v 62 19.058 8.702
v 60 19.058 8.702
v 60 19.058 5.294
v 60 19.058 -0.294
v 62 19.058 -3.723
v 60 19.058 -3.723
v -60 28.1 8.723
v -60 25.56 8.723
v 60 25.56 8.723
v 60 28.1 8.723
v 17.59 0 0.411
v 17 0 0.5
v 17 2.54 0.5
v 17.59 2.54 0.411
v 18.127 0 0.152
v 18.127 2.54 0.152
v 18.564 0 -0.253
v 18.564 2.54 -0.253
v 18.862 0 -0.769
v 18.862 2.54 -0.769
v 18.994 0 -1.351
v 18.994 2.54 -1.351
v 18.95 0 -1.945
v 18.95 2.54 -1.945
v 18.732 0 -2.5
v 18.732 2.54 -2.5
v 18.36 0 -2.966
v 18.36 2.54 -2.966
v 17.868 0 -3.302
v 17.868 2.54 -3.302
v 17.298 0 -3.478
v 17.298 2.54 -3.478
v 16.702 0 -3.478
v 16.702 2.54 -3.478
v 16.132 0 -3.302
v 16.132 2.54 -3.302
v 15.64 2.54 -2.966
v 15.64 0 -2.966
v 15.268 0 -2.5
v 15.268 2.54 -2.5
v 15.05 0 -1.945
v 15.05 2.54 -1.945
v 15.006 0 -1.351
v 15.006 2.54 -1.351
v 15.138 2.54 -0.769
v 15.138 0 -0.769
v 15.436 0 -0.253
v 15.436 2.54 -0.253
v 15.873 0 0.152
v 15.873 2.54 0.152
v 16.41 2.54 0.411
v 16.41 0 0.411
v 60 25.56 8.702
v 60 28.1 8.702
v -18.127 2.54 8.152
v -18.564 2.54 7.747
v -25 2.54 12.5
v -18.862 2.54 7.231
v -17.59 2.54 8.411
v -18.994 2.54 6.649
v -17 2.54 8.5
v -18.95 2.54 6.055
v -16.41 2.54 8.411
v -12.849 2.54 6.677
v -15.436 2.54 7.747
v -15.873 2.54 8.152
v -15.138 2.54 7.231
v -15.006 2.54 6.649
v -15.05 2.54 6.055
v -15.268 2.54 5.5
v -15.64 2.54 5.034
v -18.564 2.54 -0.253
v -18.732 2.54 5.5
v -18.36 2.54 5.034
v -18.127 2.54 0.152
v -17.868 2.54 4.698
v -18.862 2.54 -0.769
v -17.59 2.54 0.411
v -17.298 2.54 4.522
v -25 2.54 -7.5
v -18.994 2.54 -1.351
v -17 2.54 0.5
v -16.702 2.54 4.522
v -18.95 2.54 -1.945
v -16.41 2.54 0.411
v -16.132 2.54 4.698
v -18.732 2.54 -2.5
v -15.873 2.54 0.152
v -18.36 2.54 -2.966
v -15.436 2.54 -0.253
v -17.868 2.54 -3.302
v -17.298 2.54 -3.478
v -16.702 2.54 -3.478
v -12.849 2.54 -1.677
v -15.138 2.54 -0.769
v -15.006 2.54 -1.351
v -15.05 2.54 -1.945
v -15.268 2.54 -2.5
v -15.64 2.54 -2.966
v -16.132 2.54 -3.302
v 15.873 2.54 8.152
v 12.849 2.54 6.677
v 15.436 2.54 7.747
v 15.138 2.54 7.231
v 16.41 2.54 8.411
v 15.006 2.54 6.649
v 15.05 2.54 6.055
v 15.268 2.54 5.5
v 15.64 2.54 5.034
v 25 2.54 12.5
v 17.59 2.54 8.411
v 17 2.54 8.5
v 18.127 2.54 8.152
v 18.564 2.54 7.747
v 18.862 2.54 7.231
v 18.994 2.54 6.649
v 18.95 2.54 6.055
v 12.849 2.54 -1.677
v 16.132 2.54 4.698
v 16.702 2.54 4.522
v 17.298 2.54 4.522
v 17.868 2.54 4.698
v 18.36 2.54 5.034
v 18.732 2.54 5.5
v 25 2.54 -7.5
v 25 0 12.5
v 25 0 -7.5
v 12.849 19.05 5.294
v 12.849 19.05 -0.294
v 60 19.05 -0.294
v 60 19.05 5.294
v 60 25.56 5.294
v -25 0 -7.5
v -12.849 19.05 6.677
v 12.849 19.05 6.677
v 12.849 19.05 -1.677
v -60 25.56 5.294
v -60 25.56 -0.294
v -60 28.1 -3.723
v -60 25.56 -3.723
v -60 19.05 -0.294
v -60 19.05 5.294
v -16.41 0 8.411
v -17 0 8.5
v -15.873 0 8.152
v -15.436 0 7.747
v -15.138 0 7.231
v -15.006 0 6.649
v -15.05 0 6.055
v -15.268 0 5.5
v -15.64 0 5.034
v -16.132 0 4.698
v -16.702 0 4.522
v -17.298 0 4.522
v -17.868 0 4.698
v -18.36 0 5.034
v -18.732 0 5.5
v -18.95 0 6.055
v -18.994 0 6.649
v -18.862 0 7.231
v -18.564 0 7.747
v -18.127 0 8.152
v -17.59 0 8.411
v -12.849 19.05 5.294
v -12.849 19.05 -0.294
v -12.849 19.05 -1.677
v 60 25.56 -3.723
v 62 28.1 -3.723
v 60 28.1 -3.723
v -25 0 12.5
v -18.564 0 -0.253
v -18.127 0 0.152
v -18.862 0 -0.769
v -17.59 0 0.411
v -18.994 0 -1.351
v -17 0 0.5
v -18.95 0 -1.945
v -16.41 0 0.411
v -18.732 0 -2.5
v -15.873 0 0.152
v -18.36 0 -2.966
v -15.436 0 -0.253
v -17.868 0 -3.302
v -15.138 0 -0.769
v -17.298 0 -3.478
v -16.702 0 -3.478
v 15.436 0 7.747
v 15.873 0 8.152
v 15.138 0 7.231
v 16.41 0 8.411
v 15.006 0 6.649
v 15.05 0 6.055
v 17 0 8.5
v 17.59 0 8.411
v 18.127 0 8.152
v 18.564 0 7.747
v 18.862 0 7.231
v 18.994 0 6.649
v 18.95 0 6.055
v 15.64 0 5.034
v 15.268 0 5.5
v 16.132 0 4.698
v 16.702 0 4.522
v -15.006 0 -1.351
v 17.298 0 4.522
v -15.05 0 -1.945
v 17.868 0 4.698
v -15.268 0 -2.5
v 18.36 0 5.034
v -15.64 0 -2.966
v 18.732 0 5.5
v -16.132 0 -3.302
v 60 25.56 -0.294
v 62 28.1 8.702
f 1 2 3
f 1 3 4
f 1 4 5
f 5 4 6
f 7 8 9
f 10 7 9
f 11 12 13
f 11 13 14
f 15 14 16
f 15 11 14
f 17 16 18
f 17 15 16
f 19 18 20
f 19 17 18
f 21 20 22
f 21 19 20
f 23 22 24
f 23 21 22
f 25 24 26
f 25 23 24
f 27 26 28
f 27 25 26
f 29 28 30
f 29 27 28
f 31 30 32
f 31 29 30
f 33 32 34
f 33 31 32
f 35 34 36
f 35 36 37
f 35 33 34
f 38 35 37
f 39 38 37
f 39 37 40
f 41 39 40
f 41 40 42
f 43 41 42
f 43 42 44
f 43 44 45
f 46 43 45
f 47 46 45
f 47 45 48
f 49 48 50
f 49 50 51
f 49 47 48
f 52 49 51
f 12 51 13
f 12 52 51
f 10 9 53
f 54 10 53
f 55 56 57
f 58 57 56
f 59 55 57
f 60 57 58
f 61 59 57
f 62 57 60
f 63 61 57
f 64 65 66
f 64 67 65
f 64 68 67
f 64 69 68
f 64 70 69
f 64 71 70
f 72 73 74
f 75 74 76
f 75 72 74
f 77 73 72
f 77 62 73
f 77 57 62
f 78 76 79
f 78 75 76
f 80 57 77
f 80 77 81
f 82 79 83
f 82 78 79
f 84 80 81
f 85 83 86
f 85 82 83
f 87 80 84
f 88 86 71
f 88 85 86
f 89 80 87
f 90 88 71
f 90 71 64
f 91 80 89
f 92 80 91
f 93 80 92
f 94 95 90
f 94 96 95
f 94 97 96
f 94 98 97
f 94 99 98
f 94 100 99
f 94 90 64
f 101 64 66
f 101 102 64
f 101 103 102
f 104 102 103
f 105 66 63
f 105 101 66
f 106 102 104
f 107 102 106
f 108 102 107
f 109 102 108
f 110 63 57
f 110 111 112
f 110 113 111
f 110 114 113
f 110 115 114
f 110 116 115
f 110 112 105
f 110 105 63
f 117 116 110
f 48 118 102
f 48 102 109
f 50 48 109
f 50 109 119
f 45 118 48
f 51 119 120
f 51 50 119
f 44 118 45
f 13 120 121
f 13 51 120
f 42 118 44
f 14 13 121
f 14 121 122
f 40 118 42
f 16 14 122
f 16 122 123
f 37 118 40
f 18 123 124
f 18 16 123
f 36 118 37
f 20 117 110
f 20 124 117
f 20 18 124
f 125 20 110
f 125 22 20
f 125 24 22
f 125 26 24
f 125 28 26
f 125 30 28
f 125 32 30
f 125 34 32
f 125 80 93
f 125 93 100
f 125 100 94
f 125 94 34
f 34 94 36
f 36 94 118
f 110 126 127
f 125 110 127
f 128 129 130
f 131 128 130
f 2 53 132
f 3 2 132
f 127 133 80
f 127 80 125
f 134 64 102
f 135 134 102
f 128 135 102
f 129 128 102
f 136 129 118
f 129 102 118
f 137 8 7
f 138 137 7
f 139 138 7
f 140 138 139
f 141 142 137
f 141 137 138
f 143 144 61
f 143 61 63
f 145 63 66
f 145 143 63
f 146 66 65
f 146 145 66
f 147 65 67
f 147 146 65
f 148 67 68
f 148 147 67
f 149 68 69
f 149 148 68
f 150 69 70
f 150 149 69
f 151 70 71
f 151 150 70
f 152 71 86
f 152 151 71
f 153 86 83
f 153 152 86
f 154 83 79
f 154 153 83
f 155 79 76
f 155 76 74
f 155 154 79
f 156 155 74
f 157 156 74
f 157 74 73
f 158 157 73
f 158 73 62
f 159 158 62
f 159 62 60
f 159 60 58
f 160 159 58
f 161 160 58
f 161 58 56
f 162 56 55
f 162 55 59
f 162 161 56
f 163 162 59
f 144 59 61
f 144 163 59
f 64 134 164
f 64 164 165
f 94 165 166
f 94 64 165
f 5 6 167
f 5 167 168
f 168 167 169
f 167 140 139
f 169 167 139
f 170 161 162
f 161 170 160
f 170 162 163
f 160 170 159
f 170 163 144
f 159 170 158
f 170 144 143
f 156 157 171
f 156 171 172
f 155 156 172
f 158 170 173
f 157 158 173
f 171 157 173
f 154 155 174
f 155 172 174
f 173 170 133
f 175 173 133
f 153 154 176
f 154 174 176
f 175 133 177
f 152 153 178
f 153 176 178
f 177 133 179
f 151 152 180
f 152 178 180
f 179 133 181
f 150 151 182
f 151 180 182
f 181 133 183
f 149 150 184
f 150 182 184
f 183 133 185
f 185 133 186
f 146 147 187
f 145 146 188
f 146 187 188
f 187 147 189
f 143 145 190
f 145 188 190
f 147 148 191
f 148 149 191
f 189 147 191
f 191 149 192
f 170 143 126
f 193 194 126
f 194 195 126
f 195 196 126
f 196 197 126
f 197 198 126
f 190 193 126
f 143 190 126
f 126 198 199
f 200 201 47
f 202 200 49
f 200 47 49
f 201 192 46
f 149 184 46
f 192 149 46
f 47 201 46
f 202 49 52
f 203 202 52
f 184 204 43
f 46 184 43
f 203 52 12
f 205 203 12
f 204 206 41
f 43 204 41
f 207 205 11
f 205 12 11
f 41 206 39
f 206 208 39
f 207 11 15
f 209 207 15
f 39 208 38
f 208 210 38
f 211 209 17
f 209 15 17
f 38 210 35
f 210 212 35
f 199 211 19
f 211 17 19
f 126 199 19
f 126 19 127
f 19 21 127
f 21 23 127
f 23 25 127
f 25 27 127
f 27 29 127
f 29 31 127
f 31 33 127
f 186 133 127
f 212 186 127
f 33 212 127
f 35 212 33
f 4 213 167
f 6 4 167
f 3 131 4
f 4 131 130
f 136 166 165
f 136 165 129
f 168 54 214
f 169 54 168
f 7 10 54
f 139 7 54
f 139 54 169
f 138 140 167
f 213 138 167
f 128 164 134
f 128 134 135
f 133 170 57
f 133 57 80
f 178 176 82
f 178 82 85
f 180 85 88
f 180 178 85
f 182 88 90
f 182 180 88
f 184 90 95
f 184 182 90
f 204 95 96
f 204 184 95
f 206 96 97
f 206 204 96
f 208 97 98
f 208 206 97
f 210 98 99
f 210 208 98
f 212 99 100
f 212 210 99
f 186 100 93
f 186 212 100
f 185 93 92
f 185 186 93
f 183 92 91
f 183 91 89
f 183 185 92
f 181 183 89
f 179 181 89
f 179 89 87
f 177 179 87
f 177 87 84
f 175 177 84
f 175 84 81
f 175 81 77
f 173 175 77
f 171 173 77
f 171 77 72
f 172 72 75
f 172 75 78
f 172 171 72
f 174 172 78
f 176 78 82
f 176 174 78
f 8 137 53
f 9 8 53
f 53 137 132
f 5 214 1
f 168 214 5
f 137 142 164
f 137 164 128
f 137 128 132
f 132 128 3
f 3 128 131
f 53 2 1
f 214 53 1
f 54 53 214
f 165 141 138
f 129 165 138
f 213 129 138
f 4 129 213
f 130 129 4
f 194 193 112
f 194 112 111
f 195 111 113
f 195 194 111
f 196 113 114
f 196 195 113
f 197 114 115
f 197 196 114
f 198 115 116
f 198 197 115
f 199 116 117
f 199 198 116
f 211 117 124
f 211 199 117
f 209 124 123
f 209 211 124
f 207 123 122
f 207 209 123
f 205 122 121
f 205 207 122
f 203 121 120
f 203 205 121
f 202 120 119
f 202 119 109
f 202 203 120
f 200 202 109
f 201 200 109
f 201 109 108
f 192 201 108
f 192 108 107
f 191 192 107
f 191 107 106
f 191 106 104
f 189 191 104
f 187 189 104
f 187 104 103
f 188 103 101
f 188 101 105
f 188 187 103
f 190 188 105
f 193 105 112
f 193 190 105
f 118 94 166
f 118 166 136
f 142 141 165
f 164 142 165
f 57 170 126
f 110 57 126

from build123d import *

# Parameters (mm, degrees)
SKETCH1_W           = 50
SKETCH1_H           = 20
SKETCH1_R           = 2
BOSS_EXTRUDE1_DEPTH = 2.54
SKETCH2_W           = 25.697892262
SKETCH2_H           = 8.354695914
BOSS_EXTRUDE2_DEPTH = 16.51
SKETCH3_W           = 120
SKETCH3_H           = 5.588
BOSS_EXTRUDE3_DEPTH = 6.51
SKETCH4_W           = 120
SKETCH4_H           = 12.446
BOSS_EXTRUDE4_DEPTH = 2.54
SKETCH6_W           = 12.425038184
SKETCH6_H           = 9.042273223
BOSS_EXTRUDE6_DEPTH = 2


with BuildPart() as part:
    # Sketch1 → Boss-Extrude1 (new body)
    with BuildSketch(Plane(origin=(0, 0, 0), x_dir=(1, 0, 0), z_dir=(0, 1, 0))):
        with Locations((0, -2.5)):
            Rectangle(SKETCH1_W, SKETCH1_H)
        with Locations((-17, -6.5)):
            Circle(SKETCH1_R, mode=Mode.SUBTRACT)
        with Locations((17, -6.5)):
            Circle(SKETCH1_R, mode=Mode.SUBTRACT)
        with Locations((-17, 1.5)):
            Circle(SKETCH1_R, mode=Mode.SUBTRACT)
        with Locations((17, 1.5)):
            Circle(SKETCH1_R, mode=Mode.SUBTRACT)
    extrude(amount=BOSS_EXTRUDE1_DEPTH)

    # Sketch2 → Boss-Extrude2 (add)
    with BuildSketch(Plane(origin=(0, 2.54, 0), x_dir=(1, 0, 0), z_dir=(0, 1, 0))):
        with Locations((0, -2.5)):
            Rectangle(SKETCH2_W, SKETCH2_H)
    extrude(amount=BOSS_EXTRUDE2_DEPTH)

    # Sketch3 → Boss-Extrude3 (add)
    with BuildSketch(Plane(origin=(0, 19.05, 0), x_dir=(1, 0, 0), z_dir=(0, 1, 0))):
        with Locations((0, -2.5)):
            Rectangle(SKETCH3_W, SKETCH3_H)
    extrude(amount=BOSS_EXTRUDE3_DEPTH)

    # Sketch4 → Boss-Extrude4 (add)
    with BuildSketch(Plane(origin=(0, 25.56, 0), x_dir=(1, 0, 0), z_dir=(0, 1, 0))):
        with Locations((0, -2.5)):
            Rectangle(SKETCH4_W, SKETCH4_H)
    extrude(amount=BOSS_EXTRUDE4_DEPTH)

    # Sketch6 → Boss-Extrude6 (add)
    with BuildSketch(Plane(origin=(60, 0, 0), x_dir=(0, 0, -1), z_dir=(1, 0, 0))):
        with Locations((-2.489519092, 23.578863389)):
            Rectangle(SKETCH6_W, SKETCH6_H)
    extrude(amount=BOSS_EXTRUDE6_DEPTH)


solid = part.part
